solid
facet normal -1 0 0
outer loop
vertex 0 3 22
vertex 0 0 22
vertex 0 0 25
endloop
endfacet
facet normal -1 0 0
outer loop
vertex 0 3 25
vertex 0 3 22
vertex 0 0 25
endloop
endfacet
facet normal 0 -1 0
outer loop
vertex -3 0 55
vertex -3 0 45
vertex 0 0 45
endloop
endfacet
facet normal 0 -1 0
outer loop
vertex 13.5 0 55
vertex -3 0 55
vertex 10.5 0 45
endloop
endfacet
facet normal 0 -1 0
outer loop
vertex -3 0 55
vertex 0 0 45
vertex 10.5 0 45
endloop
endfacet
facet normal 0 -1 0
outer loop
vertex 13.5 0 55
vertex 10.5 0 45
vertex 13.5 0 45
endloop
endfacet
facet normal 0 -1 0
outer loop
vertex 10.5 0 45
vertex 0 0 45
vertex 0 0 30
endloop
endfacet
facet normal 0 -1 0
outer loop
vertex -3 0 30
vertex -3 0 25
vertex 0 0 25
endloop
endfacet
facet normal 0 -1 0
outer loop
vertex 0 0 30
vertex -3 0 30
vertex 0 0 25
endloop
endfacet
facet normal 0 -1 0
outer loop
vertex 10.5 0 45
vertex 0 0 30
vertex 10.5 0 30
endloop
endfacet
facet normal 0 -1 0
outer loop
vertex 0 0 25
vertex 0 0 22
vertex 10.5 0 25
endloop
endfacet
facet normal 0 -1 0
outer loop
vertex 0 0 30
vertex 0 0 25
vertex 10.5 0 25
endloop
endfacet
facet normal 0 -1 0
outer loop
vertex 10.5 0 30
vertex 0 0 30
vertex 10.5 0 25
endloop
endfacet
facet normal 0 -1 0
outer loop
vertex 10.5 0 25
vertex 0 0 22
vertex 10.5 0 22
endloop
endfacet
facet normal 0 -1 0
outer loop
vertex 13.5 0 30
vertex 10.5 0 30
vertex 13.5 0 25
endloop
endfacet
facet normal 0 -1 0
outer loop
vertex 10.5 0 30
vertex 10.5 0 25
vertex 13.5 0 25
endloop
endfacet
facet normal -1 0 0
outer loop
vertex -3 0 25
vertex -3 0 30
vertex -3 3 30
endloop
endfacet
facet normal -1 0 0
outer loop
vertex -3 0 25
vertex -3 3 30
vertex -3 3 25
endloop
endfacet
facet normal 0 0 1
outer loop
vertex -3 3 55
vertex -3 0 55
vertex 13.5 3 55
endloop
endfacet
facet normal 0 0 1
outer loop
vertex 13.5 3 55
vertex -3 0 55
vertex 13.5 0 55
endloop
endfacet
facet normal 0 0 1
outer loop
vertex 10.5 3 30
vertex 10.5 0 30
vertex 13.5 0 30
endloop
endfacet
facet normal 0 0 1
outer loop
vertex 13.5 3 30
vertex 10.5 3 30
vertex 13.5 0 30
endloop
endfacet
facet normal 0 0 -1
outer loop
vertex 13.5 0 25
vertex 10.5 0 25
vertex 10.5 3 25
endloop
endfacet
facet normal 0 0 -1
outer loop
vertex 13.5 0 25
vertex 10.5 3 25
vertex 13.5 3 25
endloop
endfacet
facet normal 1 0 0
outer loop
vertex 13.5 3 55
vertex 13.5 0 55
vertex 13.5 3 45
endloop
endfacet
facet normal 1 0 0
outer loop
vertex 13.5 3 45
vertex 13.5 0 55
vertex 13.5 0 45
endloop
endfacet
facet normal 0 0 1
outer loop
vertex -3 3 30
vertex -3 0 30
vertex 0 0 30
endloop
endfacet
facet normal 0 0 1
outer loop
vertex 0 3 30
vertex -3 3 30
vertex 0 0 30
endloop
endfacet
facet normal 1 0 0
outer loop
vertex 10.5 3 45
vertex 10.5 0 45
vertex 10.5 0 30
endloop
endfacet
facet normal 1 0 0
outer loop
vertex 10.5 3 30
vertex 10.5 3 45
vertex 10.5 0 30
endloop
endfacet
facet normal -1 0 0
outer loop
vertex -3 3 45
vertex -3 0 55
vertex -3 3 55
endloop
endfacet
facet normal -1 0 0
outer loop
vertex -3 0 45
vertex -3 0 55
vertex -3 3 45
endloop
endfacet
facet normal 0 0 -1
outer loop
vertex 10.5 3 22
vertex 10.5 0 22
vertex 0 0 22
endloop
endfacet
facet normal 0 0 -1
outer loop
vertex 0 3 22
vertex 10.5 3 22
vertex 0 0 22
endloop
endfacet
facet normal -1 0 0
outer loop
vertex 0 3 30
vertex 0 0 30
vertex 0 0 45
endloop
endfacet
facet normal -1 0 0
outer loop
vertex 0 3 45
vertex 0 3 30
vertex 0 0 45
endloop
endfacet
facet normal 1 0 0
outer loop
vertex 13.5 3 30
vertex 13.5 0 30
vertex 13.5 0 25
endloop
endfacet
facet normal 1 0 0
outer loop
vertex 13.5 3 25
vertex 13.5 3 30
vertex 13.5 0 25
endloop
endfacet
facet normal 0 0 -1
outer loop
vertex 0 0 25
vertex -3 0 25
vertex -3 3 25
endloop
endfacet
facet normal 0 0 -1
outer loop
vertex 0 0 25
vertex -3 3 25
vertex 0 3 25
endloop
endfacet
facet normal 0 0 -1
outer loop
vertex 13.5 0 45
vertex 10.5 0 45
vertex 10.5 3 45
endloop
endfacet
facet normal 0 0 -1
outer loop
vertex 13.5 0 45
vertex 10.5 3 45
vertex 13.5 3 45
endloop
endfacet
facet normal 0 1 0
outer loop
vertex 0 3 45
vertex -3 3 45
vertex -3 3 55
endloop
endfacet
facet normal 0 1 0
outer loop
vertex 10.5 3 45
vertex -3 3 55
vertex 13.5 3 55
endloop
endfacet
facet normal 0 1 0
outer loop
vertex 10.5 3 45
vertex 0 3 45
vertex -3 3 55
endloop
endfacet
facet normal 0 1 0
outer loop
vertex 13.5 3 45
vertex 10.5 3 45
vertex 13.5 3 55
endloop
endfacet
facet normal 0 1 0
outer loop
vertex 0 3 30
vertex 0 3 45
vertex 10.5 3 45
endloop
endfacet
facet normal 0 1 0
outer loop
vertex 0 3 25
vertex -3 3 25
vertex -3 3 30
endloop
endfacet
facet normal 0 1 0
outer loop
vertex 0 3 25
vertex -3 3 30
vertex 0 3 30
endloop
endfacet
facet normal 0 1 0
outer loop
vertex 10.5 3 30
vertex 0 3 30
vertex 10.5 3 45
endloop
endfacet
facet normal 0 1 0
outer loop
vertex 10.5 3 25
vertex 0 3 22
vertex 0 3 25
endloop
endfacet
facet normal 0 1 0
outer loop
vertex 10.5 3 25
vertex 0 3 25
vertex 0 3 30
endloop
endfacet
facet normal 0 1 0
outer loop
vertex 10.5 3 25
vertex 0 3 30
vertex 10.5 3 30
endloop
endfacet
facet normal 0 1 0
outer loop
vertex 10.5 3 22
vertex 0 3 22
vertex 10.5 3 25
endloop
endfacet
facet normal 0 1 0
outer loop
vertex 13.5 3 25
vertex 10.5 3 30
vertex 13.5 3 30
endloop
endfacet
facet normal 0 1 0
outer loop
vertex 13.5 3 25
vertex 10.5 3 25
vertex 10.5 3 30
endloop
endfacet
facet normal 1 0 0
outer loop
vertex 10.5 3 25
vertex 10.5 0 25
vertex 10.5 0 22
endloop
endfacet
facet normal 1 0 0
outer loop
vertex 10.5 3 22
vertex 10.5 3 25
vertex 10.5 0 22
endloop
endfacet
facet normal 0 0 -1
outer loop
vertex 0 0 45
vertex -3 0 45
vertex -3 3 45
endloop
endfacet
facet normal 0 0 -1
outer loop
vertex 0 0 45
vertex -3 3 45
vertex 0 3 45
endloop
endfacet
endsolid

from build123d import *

# Parameters (mm, degrees)
SKETCH_1_W      = 3
SKETCH_1_H      = 10
SKETCH_1_H_2    = 5
EXTRUDE_1_DEPTH = 3


with BuildPart() as part:
    # 草图1 → 凸台-拉伸1 (new body)
    with BuildSketch(Plane(origin=(0, 0, 0), x_dir=(1, 0, 0), z_dir=(0, 1, 0))):
        Polygon((0, -45), (0, -55), (10.5, -55), (10.5, -45), (10.5, -30), (10.5, -25), (10.5, -22), (0, -22), (0, -25), (0, -30), align=None)
        with Locations((12, -50)):
            Rectangle(SKETCH_1_W, SKETCH_1_H)
        with Locations((-1.5, -50)):
            Rectangle(SKETCH_1_W, SKETCH_1_H)
        with Locations((-1.5, -27.5)):
            Rectangle(SKETCH_1_W, SKETCH_1_H_2)
        with Locations((12, -27.5)):
            Rectangle(SKETCH_1_W, SKETCH_1_H_2)
    extrude(amount=EXTRUDE_1_DEPTH)


solid = part.part
